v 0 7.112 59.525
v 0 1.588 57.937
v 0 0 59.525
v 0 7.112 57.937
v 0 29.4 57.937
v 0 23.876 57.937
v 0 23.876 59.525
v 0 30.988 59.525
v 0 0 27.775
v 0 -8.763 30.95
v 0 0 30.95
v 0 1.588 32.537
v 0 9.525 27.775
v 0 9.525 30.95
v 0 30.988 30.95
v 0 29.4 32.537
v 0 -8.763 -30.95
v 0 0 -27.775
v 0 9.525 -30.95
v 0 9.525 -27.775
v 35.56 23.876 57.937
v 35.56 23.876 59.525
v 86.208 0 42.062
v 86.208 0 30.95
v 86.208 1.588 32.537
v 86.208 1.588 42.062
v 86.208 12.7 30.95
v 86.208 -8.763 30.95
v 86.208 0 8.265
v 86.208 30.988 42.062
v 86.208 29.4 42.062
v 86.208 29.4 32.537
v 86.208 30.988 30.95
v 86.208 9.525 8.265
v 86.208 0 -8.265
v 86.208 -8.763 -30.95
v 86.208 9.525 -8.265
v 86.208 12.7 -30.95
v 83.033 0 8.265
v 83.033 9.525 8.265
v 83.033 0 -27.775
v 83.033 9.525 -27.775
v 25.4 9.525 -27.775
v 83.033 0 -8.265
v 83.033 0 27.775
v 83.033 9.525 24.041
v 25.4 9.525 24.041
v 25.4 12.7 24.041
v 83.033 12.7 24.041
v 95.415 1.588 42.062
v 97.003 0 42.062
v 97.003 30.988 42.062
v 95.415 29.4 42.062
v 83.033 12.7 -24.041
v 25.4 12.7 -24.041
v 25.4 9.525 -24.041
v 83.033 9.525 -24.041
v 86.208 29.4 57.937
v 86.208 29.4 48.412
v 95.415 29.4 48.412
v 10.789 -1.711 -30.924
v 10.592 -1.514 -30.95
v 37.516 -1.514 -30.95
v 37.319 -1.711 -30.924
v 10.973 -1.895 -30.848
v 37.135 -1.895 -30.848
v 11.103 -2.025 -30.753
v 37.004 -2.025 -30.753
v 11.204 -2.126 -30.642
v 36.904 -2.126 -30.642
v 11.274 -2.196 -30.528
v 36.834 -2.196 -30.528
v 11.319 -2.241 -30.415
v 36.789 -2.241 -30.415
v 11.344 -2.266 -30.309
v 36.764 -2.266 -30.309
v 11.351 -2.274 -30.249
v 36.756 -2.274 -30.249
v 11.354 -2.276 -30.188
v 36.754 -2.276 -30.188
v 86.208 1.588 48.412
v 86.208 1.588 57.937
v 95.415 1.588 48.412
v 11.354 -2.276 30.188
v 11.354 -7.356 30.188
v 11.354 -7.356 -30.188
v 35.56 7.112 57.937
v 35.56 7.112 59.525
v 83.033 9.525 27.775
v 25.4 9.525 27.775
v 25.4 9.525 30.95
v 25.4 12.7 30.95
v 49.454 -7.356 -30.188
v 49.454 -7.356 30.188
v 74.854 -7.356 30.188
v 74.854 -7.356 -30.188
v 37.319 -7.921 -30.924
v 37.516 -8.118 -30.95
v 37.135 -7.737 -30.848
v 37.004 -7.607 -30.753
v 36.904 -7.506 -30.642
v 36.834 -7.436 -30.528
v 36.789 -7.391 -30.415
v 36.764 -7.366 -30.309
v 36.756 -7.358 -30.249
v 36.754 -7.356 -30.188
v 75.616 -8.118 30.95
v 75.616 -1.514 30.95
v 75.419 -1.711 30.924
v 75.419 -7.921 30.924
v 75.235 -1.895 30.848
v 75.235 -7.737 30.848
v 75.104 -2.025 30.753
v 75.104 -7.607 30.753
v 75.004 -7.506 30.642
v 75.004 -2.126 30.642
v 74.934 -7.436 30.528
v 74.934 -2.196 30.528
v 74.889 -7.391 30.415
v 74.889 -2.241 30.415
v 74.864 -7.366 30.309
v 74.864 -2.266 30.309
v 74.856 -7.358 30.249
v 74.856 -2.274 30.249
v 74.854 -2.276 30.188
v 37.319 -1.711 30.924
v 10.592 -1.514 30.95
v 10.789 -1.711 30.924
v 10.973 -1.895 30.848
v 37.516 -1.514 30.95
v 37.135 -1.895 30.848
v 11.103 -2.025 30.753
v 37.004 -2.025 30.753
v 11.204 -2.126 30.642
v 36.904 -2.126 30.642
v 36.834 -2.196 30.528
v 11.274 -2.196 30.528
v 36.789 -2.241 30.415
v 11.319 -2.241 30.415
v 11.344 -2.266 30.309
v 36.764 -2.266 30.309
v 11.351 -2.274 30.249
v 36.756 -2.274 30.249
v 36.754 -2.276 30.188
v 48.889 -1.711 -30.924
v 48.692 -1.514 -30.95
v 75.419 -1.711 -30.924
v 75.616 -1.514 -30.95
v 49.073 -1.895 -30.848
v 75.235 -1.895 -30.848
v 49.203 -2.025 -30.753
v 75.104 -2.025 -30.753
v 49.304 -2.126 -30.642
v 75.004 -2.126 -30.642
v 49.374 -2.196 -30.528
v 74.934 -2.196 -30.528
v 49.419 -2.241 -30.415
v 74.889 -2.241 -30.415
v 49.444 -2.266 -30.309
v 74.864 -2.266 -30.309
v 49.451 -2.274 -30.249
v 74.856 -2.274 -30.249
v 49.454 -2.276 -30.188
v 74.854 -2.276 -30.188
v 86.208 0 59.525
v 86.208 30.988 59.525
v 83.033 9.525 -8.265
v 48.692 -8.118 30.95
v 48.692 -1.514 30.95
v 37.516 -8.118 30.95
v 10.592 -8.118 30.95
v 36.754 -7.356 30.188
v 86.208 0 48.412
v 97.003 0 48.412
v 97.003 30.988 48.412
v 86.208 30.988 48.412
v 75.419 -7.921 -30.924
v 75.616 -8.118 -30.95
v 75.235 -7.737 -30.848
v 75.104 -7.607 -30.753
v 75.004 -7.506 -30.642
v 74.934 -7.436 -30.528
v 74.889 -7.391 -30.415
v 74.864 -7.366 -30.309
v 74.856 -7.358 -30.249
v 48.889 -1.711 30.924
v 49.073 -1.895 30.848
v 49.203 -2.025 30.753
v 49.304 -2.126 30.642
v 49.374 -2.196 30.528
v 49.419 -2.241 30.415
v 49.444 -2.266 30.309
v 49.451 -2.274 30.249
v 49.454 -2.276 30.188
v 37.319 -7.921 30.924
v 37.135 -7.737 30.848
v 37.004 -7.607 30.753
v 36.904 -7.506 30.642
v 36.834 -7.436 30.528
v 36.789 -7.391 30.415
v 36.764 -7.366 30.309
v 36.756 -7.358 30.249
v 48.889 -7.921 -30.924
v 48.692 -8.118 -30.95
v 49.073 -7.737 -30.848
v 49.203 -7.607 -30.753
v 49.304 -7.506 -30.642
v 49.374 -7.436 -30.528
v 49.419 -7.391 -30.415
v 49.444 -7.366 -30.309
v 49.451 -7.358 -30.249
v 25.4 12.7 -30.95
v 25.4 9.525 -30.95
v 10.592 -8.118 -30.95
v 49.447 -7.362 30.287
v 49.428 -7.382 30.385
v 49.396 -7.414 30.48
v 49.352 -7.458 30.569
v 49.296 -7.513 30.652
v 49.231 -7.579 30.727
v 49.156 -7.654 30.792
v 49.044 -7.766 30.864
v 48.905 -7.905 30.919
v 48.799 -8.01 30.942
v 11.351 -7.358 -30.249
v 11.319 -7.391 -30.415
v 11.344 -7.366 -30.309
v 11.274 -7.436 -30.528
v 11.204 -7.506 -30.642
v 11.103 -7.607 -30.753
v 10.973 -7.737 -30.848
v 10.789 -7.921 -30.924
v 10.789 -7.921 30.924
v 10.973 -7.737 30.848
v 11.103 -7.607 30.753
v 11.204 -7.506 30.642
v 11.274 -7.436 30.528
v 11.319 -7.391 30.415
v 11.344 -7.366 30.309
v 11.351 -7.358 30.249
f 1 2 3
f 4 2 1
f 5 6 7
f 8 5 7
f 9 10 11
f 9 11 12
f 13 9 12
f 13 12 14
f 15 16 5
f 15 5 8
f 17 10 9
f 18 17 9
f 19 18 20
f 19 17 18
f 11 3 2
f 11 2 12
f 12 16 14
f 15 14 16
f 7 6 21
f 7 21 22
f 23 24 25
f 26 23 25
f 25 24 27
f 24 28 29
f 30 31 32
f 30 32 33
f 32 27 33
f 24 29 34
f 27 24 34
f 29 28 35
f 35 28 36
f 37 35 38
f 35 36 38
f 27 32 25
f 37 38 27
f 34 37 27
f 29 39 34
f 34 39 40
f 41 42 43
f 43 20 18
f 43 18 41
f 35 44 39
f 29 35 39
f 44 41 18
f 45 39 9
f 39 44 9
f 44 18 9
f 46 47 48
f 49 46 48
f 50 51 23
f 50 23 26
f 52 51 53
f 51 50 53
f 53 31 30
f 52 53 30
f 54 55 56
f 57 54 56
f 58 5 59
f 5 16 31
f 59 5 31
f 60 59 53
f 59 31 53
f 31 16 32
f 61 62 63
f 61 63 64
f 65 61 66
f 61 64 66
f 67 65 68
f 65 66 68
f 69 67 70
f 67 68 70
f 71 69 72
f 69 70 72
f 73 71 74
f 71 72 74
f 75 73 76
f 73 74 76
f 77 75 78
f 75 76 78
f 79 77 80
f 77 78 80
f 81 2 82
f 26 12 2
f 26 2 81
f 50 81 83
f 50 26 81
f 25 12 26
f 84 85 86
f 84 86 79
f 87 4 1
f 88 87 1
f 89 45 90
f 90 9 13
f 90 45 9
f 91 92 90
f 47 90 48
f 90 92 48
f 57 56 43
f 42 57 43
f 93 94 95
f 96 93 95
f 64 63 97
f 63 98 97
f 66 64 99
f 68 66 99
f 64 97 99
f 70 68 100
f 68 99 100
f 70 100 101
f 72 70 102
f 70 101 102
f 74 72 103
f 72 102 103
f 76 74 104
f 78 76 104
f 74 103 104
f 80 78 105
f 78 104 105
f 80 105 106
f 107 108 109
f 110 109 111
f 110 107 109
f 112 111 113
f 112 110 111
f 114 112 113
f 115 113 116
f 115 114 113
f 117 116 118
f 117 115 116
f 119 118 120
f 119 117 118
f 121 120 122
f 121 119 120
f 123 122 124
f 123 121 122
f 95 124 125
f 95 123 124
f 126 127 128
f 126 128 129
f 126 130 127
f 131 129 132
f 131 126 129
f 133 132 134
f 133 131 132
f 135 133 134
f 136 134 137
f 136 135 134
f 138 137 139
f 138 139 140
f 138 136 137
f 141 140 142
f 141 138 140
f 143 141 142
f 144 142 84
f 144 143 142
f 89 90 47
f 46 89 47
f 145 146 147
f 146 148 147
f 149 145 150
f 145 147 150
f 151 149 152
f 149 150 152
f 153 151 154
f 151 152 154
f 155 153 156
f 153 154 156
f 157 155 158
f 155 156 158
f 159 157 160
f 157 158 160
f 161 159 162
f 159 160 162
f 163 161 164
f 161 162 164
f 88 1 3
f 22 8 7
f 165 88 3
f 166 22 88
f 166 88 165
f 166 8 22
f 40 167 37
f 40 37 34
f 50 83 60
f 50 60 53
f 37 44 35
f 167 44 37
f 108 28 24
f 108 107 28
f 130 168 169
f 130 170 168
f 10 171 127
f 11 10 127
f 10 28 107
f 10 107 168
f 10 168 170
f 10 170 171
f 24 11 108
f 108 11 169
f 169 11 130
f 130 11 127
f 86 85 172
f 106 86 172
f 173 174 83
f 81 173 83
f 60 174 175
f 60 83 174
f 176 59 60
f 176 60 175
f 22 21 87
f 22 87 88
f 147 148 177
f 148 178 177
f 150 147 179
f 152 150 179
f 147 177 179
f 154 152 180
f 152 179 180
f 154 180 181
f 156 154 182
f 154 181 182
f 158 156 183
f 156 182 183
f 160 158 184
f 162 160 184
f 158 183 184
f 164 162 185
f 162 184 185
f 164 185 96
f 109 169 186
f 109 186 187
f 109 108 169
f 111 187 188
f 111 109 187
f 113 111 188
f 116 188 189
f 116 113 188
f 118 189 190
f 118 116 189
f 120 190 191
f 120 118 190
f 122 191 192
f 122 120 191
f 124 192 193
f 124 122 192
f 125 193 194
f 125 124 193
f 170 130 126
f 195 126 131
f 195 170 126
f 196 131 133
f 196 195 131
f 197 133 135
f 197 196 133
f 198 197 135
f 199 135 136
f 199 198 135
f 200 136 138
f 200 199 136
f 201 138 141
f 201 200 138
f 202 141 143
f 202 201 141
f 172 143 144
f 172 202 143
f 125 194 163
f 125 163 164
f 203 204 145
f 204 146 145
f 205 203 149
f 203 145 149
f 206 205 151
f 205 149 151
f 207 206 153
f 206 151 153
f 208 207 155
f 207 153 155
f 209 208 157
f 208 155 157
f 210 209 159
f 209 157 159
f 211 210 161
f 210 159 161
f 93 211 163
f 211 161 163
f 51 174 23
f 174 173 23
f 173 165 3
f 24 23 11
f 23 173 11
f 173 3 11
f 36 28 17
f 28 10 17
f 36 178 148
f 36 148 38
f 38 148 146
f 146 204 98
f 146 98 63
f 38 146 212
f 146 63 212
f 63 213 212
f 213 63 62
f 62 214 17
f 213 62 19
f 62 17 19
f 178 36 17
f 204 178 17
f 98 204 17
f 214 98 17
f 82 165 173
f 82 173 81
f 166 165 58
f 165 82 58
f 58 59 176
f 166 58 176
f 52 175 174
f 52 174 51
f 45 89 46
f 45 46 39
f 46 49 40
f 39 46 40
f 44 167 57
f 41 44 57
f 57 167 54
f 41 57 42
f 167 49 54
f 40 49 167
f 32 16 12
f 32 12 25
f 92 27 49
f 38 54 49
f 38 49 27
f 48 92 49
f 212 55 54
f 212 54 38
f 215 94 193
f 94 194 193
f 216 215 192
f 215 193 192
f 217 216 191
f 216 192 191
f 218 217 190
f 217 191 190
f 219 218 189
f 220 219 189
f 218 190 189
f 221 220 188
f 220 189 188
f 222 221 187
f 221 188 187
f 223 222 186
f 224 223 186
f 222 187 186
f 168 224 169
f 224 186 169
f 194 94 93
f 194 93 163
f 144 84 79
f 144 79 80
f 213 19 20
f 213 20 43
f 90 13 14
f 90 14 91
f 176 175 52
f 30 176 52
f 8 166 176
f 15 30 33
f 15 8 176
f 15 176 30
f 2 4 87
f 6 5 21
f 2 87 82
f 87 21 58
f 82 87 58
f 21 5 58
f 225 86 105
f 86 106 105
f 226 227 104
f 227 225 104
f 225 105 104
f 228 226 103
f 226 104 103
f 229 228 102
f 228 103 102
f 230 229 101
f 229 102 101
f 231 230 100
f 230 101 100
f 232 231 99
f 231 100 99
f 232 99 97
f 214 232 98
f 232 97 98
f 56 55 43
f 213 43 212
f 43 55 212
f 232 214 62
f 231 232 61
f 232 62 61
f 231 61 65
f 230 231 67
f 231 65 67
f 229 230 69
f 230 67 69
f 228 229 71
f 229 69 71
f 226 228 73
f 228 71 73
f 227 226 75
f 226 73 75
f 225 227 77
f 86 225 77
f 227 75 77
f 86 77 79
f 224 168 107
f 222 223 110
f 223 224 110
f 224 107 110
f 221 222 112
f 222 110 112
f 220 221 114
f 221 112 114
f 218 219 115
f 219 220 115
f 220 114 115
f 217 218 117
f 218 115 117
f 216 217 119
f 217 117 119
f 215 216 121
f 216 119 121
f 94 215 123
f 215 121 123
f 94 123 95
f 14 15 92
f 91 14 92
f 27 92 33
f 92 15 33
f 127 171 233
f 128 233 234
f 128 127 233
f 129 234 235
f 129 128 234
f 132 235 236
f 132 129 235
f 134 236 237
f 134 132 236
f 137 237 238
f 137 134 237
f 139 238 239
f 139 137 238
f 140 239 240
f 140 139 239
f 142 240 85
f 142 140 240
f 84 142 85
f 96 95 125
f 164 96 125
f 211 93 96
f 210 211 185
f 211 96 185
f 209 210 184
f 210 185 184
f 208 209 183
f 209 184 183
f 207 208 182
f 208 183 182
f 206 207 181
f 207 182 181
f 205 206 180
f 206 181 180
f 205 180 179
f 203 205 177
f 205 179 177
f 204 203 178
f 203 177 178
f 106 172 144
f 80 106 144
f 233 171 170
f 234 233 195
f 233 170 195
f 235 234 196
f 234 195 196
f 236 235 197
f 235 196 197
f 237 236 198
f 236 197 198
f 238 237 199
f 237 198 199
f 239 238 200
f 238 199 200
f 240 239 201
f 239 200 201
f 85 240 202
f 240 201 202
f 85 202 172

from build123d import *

# Parameters (mm, degrees)
BOSS_EXTRUDE1_DEPTH  = 83.0326
SKETCH2_W            = 61.8998
SKETCH2_H            = 21.463
BOSS_EXTRUDE2_DEPTH  = 3.175
SKETCH3_W            = 25.4
SKETCH3_H            = 5.08
CUT_EXTRUDE1_DEPTH   = 107.886039958
FILLET1_R            = 0.762
FILLET2_R            = 0.762
FILLET3_R            = 0.762
SKETCH5_W            = 16.529901782
SKETCH5_H            = 9.525
CUT_EXTRUDE2_DEPTH   = 90.51870739
SKETCH41_W           = 86.2076
SKETCH41_H           = 30.988
BOSS_EXTRUDE10_DEPTH = 1.5875
SKETCH42_W           = 86.2076
SKETCH42_H           = 1.5875
BOSS_EXTRUDE11_DEPTH = 25.4
SKETCH47_W           = 86.2076
SKETCH47_H           = 1.5875
BOSS_EXTRUDE13_DEPTH = 25.4
SKETCH48_W           = 86.2076
SKETCH48_H           = 30.988
BOSS_EXTRUDE14_DEPTH = 1.5875
SKETCH49_W           = 1.5875
SKETCH49_H           = 16.764
CUT_EXTRUDE5_DEPTH   = 35.56
SKETCH50_W           = 6.35
SKETCH50_H           = 1.5875
BOSS_EXTRUDE15_DEPTH = 9.2075
SKETCH52_W           = 6.35
SKETCH52_H           = 30.988
BOSS_EXTRUDE17_DEPTH = 1.5875
SKETCH53_W           = 25.4
SKETCH53_H           = 61.8998
CUT_EXTRUDE6_DEPTH   = 3.175


with BuildPart() as part:
    # Sketch1 → Boss-Extrude1 (new body)
    with BuildSketch(Plane(origin=(0, 0, 0), x_dir=(0, 0, -1), z_dir=(1, 0, 0))):
        Polygon((-27.7749, 9.525), (-24.0411, 9.525), (-24.0411, 12.7), (-30.9499, 12.7), (-30.9499, -3.175), (-30.9499, -8.763), (30.9499, -8.763), (30.9499, -3.175), (30.9499, 12.7), (24.0411, 12.7), (24.0411, 9.525), (27.7749, 9.525), (27.7749, 0), (-27.7749, 0), align=None)
    extrude(amount=BOSS_EXTRUDE1_DEPTH)

    # Sketch2 → Boss-Extrude2 (add)
    with BuildSketch(Plane(origin=(83.0326, 0, 0), x_dir=(0, 0, -1), z_dir=(1, 0, 0))):
        with Locations((0, 1.9685)):
            Rectangle(SKETCH2_W, SKETCH2_H)
    extrude(amount=BOSS_EXTRUDE2_DEPTH)

    # Sketch3 → Cut-Extrude1 (cut, through all)
    with BuildSketch(Plane.XY.offset(30.9499)):
        with Locations((24.0538, -4.815937668)):
            Rectangle(SKETCH3_W, SKETCH3_H)
        with Locations((62.1538, -4.815937668)):
            Rectangle(SKETCH3_W, SKETCH3_H)
    extrude(amount=-CUT_EXTRUDE1_DEPTH, mode=Mode.SUBTRACT)

    # Fillet1
    fillet1_edges = [part.edges().sort_by_distance(p)[0] for p in [
        (24.0538, -7.355937668, -30.9499),
        (24.0538, -7.355937668, 30.9499),
        (62.1538, -7.355937668, -30.9499),
        (62.1538, -7.355937668, 30.9499),
    ]]
    fillet(fillet1_edges, radius=FILLET1_R)

    # Fillet2
    fillet2_edges = [part.edges().sort_by_distance(p)[0] for p in [
        (11.3538, -5.196937668, -30.9499),
        (24.0538, -2.275937668, -30.9499),
        (36.7538, -5.196937668, -30.9499),
        (49.4538, -5.196937668, -30.9499),
        (62.1538, -2.275937668, -30.9499),
        (74.8538, -5.196937668, -30.9499),
    ]]
    fillet(fillet2_edges, radius=FILLET2_R)

    # Fillet3
    fillet3_edges = [part.edges().sort_by_distance(p)[0] for p in [
        (74.8538, -5.196937668, 30.9499),
        (62.1538, -2.275937668, 30.9499),
        (49.4538, -5.196937668, 30.9499),
        (11.3538, -5.196937668, 30.9499),
        (24.0538, -2.275937668, 30.9499),
        (36.7538, -5.196937668, 30.9499),
    ]]
    fillet(fillet3_edges, radius=FILLET3_R)

    # Sketch5 → Cut-Extrude2 (cut, through all)
    with BuildSketch(Plane.ZY.offset(-83.0326)):
        with Locations((0, 4.7625)):
            Rectangle(SKETCH5_W, SKETCH5_H)
    extrude(amount=-CUT_EXTRUDE2_DEPTH, mode=Mode.SUBTRACT)

    # Sketch41 → Boss-Extrude10 (add)
    with BuildSketch(Plane.XY.offset(30.9499)):
        with Locations((43.1038, 15.494)):
            Rectangle(SKETCH41_W, SKETCH41_H)
    extrude(amount=BOSS_EXTRUDE10_DEPTH)

    # Sketch42 → Boss-Extrude11 (add)
    with BuildSketch(Plane.XY.offset(32.5374)):
        with Locations((43.1038, 0.79375)):
            Rectangle(SKETCH42_W, SKETCH42_H)
    extrude(amount=BOSS_EXTRUDE11_DEPTH)

    # Sketch47 → Boss-Extrude13 (add)
    with BuildSketch(Plane.XY.offset(32.5374)):
        with Locations((43.1038, 30.19425)):
            Rectangle(SKETCH47_W, SKETCH47_H)
    extrude(amount=BOSS_EXTRUDE13_DEPTH)

    # Sketch48 → Boss-Extrude14 (add)
    with BuildSketch(Plane.XY.offset(57.9374)):
        with Locations((43.1038, 15.494)):
            Rectangle(SKETCH48_W, SKETCH48_H)
    extrude(amount=BOSS_EXTRUDE14_DEPTH)

    # Sketch49 → Cut-Extrude5 (cut)
    with BuildSketch(Plane.ZY):
        with Locations((58.73115, 15.494)):
            Rectangle(SKETCH49_W, SKETCH49_H)
    extrude(amount=-CUT_EXTRUDE5_DEPTH, mode=Mode.SUBTRACT)

    # Sketch50 → Boss-Extrude15 (add)
    with BuildSketch(Plane(origin=(86.2076, 0, 0), x_dir=(0, 0, -1), z_dir=(1, 0, 0))):
        with Locations((-45.2374, 30.19425)):
            Rectangle(SKETCH50_W, SKETCH50_H)
        with Locations((-45.2374, 0.79375)):
            Rectangle(SKETCH50_W, SKETCH50_H)
    extrude(amount=BOSS_EXTRUDE15_DEPTH)

    # Sketch52 → Boss-Extrude17 (add)
    with BuildSketch(Plane(origin=(95.4151, 0, 0), x_dir=(0, 0, -1), z_dir=(1, 0, 0))):
        with Locations((-45.2374, 15.494)):
            Rectangle(SKETCH52_W, SKETCH52_H)
    extrude(amount=BOSS_EXTRUDE17_DEPTH)

    # Sketch53 → Cut-Extrude6 (cut)
    with BuildSketch(Plane(origin=(0, 12.7, 0), x_dir=(1, 0, 0), z_dir=(0, 1, 0))):
        with Locations((12.7, 0)):
            Rectangle(SKETCH53_W, SKETCH53_H)
    extrude(amount=-CUT_EXTRUDE6_DEPTH, mode=Mode.SUBTRACT)


solid = part.part
